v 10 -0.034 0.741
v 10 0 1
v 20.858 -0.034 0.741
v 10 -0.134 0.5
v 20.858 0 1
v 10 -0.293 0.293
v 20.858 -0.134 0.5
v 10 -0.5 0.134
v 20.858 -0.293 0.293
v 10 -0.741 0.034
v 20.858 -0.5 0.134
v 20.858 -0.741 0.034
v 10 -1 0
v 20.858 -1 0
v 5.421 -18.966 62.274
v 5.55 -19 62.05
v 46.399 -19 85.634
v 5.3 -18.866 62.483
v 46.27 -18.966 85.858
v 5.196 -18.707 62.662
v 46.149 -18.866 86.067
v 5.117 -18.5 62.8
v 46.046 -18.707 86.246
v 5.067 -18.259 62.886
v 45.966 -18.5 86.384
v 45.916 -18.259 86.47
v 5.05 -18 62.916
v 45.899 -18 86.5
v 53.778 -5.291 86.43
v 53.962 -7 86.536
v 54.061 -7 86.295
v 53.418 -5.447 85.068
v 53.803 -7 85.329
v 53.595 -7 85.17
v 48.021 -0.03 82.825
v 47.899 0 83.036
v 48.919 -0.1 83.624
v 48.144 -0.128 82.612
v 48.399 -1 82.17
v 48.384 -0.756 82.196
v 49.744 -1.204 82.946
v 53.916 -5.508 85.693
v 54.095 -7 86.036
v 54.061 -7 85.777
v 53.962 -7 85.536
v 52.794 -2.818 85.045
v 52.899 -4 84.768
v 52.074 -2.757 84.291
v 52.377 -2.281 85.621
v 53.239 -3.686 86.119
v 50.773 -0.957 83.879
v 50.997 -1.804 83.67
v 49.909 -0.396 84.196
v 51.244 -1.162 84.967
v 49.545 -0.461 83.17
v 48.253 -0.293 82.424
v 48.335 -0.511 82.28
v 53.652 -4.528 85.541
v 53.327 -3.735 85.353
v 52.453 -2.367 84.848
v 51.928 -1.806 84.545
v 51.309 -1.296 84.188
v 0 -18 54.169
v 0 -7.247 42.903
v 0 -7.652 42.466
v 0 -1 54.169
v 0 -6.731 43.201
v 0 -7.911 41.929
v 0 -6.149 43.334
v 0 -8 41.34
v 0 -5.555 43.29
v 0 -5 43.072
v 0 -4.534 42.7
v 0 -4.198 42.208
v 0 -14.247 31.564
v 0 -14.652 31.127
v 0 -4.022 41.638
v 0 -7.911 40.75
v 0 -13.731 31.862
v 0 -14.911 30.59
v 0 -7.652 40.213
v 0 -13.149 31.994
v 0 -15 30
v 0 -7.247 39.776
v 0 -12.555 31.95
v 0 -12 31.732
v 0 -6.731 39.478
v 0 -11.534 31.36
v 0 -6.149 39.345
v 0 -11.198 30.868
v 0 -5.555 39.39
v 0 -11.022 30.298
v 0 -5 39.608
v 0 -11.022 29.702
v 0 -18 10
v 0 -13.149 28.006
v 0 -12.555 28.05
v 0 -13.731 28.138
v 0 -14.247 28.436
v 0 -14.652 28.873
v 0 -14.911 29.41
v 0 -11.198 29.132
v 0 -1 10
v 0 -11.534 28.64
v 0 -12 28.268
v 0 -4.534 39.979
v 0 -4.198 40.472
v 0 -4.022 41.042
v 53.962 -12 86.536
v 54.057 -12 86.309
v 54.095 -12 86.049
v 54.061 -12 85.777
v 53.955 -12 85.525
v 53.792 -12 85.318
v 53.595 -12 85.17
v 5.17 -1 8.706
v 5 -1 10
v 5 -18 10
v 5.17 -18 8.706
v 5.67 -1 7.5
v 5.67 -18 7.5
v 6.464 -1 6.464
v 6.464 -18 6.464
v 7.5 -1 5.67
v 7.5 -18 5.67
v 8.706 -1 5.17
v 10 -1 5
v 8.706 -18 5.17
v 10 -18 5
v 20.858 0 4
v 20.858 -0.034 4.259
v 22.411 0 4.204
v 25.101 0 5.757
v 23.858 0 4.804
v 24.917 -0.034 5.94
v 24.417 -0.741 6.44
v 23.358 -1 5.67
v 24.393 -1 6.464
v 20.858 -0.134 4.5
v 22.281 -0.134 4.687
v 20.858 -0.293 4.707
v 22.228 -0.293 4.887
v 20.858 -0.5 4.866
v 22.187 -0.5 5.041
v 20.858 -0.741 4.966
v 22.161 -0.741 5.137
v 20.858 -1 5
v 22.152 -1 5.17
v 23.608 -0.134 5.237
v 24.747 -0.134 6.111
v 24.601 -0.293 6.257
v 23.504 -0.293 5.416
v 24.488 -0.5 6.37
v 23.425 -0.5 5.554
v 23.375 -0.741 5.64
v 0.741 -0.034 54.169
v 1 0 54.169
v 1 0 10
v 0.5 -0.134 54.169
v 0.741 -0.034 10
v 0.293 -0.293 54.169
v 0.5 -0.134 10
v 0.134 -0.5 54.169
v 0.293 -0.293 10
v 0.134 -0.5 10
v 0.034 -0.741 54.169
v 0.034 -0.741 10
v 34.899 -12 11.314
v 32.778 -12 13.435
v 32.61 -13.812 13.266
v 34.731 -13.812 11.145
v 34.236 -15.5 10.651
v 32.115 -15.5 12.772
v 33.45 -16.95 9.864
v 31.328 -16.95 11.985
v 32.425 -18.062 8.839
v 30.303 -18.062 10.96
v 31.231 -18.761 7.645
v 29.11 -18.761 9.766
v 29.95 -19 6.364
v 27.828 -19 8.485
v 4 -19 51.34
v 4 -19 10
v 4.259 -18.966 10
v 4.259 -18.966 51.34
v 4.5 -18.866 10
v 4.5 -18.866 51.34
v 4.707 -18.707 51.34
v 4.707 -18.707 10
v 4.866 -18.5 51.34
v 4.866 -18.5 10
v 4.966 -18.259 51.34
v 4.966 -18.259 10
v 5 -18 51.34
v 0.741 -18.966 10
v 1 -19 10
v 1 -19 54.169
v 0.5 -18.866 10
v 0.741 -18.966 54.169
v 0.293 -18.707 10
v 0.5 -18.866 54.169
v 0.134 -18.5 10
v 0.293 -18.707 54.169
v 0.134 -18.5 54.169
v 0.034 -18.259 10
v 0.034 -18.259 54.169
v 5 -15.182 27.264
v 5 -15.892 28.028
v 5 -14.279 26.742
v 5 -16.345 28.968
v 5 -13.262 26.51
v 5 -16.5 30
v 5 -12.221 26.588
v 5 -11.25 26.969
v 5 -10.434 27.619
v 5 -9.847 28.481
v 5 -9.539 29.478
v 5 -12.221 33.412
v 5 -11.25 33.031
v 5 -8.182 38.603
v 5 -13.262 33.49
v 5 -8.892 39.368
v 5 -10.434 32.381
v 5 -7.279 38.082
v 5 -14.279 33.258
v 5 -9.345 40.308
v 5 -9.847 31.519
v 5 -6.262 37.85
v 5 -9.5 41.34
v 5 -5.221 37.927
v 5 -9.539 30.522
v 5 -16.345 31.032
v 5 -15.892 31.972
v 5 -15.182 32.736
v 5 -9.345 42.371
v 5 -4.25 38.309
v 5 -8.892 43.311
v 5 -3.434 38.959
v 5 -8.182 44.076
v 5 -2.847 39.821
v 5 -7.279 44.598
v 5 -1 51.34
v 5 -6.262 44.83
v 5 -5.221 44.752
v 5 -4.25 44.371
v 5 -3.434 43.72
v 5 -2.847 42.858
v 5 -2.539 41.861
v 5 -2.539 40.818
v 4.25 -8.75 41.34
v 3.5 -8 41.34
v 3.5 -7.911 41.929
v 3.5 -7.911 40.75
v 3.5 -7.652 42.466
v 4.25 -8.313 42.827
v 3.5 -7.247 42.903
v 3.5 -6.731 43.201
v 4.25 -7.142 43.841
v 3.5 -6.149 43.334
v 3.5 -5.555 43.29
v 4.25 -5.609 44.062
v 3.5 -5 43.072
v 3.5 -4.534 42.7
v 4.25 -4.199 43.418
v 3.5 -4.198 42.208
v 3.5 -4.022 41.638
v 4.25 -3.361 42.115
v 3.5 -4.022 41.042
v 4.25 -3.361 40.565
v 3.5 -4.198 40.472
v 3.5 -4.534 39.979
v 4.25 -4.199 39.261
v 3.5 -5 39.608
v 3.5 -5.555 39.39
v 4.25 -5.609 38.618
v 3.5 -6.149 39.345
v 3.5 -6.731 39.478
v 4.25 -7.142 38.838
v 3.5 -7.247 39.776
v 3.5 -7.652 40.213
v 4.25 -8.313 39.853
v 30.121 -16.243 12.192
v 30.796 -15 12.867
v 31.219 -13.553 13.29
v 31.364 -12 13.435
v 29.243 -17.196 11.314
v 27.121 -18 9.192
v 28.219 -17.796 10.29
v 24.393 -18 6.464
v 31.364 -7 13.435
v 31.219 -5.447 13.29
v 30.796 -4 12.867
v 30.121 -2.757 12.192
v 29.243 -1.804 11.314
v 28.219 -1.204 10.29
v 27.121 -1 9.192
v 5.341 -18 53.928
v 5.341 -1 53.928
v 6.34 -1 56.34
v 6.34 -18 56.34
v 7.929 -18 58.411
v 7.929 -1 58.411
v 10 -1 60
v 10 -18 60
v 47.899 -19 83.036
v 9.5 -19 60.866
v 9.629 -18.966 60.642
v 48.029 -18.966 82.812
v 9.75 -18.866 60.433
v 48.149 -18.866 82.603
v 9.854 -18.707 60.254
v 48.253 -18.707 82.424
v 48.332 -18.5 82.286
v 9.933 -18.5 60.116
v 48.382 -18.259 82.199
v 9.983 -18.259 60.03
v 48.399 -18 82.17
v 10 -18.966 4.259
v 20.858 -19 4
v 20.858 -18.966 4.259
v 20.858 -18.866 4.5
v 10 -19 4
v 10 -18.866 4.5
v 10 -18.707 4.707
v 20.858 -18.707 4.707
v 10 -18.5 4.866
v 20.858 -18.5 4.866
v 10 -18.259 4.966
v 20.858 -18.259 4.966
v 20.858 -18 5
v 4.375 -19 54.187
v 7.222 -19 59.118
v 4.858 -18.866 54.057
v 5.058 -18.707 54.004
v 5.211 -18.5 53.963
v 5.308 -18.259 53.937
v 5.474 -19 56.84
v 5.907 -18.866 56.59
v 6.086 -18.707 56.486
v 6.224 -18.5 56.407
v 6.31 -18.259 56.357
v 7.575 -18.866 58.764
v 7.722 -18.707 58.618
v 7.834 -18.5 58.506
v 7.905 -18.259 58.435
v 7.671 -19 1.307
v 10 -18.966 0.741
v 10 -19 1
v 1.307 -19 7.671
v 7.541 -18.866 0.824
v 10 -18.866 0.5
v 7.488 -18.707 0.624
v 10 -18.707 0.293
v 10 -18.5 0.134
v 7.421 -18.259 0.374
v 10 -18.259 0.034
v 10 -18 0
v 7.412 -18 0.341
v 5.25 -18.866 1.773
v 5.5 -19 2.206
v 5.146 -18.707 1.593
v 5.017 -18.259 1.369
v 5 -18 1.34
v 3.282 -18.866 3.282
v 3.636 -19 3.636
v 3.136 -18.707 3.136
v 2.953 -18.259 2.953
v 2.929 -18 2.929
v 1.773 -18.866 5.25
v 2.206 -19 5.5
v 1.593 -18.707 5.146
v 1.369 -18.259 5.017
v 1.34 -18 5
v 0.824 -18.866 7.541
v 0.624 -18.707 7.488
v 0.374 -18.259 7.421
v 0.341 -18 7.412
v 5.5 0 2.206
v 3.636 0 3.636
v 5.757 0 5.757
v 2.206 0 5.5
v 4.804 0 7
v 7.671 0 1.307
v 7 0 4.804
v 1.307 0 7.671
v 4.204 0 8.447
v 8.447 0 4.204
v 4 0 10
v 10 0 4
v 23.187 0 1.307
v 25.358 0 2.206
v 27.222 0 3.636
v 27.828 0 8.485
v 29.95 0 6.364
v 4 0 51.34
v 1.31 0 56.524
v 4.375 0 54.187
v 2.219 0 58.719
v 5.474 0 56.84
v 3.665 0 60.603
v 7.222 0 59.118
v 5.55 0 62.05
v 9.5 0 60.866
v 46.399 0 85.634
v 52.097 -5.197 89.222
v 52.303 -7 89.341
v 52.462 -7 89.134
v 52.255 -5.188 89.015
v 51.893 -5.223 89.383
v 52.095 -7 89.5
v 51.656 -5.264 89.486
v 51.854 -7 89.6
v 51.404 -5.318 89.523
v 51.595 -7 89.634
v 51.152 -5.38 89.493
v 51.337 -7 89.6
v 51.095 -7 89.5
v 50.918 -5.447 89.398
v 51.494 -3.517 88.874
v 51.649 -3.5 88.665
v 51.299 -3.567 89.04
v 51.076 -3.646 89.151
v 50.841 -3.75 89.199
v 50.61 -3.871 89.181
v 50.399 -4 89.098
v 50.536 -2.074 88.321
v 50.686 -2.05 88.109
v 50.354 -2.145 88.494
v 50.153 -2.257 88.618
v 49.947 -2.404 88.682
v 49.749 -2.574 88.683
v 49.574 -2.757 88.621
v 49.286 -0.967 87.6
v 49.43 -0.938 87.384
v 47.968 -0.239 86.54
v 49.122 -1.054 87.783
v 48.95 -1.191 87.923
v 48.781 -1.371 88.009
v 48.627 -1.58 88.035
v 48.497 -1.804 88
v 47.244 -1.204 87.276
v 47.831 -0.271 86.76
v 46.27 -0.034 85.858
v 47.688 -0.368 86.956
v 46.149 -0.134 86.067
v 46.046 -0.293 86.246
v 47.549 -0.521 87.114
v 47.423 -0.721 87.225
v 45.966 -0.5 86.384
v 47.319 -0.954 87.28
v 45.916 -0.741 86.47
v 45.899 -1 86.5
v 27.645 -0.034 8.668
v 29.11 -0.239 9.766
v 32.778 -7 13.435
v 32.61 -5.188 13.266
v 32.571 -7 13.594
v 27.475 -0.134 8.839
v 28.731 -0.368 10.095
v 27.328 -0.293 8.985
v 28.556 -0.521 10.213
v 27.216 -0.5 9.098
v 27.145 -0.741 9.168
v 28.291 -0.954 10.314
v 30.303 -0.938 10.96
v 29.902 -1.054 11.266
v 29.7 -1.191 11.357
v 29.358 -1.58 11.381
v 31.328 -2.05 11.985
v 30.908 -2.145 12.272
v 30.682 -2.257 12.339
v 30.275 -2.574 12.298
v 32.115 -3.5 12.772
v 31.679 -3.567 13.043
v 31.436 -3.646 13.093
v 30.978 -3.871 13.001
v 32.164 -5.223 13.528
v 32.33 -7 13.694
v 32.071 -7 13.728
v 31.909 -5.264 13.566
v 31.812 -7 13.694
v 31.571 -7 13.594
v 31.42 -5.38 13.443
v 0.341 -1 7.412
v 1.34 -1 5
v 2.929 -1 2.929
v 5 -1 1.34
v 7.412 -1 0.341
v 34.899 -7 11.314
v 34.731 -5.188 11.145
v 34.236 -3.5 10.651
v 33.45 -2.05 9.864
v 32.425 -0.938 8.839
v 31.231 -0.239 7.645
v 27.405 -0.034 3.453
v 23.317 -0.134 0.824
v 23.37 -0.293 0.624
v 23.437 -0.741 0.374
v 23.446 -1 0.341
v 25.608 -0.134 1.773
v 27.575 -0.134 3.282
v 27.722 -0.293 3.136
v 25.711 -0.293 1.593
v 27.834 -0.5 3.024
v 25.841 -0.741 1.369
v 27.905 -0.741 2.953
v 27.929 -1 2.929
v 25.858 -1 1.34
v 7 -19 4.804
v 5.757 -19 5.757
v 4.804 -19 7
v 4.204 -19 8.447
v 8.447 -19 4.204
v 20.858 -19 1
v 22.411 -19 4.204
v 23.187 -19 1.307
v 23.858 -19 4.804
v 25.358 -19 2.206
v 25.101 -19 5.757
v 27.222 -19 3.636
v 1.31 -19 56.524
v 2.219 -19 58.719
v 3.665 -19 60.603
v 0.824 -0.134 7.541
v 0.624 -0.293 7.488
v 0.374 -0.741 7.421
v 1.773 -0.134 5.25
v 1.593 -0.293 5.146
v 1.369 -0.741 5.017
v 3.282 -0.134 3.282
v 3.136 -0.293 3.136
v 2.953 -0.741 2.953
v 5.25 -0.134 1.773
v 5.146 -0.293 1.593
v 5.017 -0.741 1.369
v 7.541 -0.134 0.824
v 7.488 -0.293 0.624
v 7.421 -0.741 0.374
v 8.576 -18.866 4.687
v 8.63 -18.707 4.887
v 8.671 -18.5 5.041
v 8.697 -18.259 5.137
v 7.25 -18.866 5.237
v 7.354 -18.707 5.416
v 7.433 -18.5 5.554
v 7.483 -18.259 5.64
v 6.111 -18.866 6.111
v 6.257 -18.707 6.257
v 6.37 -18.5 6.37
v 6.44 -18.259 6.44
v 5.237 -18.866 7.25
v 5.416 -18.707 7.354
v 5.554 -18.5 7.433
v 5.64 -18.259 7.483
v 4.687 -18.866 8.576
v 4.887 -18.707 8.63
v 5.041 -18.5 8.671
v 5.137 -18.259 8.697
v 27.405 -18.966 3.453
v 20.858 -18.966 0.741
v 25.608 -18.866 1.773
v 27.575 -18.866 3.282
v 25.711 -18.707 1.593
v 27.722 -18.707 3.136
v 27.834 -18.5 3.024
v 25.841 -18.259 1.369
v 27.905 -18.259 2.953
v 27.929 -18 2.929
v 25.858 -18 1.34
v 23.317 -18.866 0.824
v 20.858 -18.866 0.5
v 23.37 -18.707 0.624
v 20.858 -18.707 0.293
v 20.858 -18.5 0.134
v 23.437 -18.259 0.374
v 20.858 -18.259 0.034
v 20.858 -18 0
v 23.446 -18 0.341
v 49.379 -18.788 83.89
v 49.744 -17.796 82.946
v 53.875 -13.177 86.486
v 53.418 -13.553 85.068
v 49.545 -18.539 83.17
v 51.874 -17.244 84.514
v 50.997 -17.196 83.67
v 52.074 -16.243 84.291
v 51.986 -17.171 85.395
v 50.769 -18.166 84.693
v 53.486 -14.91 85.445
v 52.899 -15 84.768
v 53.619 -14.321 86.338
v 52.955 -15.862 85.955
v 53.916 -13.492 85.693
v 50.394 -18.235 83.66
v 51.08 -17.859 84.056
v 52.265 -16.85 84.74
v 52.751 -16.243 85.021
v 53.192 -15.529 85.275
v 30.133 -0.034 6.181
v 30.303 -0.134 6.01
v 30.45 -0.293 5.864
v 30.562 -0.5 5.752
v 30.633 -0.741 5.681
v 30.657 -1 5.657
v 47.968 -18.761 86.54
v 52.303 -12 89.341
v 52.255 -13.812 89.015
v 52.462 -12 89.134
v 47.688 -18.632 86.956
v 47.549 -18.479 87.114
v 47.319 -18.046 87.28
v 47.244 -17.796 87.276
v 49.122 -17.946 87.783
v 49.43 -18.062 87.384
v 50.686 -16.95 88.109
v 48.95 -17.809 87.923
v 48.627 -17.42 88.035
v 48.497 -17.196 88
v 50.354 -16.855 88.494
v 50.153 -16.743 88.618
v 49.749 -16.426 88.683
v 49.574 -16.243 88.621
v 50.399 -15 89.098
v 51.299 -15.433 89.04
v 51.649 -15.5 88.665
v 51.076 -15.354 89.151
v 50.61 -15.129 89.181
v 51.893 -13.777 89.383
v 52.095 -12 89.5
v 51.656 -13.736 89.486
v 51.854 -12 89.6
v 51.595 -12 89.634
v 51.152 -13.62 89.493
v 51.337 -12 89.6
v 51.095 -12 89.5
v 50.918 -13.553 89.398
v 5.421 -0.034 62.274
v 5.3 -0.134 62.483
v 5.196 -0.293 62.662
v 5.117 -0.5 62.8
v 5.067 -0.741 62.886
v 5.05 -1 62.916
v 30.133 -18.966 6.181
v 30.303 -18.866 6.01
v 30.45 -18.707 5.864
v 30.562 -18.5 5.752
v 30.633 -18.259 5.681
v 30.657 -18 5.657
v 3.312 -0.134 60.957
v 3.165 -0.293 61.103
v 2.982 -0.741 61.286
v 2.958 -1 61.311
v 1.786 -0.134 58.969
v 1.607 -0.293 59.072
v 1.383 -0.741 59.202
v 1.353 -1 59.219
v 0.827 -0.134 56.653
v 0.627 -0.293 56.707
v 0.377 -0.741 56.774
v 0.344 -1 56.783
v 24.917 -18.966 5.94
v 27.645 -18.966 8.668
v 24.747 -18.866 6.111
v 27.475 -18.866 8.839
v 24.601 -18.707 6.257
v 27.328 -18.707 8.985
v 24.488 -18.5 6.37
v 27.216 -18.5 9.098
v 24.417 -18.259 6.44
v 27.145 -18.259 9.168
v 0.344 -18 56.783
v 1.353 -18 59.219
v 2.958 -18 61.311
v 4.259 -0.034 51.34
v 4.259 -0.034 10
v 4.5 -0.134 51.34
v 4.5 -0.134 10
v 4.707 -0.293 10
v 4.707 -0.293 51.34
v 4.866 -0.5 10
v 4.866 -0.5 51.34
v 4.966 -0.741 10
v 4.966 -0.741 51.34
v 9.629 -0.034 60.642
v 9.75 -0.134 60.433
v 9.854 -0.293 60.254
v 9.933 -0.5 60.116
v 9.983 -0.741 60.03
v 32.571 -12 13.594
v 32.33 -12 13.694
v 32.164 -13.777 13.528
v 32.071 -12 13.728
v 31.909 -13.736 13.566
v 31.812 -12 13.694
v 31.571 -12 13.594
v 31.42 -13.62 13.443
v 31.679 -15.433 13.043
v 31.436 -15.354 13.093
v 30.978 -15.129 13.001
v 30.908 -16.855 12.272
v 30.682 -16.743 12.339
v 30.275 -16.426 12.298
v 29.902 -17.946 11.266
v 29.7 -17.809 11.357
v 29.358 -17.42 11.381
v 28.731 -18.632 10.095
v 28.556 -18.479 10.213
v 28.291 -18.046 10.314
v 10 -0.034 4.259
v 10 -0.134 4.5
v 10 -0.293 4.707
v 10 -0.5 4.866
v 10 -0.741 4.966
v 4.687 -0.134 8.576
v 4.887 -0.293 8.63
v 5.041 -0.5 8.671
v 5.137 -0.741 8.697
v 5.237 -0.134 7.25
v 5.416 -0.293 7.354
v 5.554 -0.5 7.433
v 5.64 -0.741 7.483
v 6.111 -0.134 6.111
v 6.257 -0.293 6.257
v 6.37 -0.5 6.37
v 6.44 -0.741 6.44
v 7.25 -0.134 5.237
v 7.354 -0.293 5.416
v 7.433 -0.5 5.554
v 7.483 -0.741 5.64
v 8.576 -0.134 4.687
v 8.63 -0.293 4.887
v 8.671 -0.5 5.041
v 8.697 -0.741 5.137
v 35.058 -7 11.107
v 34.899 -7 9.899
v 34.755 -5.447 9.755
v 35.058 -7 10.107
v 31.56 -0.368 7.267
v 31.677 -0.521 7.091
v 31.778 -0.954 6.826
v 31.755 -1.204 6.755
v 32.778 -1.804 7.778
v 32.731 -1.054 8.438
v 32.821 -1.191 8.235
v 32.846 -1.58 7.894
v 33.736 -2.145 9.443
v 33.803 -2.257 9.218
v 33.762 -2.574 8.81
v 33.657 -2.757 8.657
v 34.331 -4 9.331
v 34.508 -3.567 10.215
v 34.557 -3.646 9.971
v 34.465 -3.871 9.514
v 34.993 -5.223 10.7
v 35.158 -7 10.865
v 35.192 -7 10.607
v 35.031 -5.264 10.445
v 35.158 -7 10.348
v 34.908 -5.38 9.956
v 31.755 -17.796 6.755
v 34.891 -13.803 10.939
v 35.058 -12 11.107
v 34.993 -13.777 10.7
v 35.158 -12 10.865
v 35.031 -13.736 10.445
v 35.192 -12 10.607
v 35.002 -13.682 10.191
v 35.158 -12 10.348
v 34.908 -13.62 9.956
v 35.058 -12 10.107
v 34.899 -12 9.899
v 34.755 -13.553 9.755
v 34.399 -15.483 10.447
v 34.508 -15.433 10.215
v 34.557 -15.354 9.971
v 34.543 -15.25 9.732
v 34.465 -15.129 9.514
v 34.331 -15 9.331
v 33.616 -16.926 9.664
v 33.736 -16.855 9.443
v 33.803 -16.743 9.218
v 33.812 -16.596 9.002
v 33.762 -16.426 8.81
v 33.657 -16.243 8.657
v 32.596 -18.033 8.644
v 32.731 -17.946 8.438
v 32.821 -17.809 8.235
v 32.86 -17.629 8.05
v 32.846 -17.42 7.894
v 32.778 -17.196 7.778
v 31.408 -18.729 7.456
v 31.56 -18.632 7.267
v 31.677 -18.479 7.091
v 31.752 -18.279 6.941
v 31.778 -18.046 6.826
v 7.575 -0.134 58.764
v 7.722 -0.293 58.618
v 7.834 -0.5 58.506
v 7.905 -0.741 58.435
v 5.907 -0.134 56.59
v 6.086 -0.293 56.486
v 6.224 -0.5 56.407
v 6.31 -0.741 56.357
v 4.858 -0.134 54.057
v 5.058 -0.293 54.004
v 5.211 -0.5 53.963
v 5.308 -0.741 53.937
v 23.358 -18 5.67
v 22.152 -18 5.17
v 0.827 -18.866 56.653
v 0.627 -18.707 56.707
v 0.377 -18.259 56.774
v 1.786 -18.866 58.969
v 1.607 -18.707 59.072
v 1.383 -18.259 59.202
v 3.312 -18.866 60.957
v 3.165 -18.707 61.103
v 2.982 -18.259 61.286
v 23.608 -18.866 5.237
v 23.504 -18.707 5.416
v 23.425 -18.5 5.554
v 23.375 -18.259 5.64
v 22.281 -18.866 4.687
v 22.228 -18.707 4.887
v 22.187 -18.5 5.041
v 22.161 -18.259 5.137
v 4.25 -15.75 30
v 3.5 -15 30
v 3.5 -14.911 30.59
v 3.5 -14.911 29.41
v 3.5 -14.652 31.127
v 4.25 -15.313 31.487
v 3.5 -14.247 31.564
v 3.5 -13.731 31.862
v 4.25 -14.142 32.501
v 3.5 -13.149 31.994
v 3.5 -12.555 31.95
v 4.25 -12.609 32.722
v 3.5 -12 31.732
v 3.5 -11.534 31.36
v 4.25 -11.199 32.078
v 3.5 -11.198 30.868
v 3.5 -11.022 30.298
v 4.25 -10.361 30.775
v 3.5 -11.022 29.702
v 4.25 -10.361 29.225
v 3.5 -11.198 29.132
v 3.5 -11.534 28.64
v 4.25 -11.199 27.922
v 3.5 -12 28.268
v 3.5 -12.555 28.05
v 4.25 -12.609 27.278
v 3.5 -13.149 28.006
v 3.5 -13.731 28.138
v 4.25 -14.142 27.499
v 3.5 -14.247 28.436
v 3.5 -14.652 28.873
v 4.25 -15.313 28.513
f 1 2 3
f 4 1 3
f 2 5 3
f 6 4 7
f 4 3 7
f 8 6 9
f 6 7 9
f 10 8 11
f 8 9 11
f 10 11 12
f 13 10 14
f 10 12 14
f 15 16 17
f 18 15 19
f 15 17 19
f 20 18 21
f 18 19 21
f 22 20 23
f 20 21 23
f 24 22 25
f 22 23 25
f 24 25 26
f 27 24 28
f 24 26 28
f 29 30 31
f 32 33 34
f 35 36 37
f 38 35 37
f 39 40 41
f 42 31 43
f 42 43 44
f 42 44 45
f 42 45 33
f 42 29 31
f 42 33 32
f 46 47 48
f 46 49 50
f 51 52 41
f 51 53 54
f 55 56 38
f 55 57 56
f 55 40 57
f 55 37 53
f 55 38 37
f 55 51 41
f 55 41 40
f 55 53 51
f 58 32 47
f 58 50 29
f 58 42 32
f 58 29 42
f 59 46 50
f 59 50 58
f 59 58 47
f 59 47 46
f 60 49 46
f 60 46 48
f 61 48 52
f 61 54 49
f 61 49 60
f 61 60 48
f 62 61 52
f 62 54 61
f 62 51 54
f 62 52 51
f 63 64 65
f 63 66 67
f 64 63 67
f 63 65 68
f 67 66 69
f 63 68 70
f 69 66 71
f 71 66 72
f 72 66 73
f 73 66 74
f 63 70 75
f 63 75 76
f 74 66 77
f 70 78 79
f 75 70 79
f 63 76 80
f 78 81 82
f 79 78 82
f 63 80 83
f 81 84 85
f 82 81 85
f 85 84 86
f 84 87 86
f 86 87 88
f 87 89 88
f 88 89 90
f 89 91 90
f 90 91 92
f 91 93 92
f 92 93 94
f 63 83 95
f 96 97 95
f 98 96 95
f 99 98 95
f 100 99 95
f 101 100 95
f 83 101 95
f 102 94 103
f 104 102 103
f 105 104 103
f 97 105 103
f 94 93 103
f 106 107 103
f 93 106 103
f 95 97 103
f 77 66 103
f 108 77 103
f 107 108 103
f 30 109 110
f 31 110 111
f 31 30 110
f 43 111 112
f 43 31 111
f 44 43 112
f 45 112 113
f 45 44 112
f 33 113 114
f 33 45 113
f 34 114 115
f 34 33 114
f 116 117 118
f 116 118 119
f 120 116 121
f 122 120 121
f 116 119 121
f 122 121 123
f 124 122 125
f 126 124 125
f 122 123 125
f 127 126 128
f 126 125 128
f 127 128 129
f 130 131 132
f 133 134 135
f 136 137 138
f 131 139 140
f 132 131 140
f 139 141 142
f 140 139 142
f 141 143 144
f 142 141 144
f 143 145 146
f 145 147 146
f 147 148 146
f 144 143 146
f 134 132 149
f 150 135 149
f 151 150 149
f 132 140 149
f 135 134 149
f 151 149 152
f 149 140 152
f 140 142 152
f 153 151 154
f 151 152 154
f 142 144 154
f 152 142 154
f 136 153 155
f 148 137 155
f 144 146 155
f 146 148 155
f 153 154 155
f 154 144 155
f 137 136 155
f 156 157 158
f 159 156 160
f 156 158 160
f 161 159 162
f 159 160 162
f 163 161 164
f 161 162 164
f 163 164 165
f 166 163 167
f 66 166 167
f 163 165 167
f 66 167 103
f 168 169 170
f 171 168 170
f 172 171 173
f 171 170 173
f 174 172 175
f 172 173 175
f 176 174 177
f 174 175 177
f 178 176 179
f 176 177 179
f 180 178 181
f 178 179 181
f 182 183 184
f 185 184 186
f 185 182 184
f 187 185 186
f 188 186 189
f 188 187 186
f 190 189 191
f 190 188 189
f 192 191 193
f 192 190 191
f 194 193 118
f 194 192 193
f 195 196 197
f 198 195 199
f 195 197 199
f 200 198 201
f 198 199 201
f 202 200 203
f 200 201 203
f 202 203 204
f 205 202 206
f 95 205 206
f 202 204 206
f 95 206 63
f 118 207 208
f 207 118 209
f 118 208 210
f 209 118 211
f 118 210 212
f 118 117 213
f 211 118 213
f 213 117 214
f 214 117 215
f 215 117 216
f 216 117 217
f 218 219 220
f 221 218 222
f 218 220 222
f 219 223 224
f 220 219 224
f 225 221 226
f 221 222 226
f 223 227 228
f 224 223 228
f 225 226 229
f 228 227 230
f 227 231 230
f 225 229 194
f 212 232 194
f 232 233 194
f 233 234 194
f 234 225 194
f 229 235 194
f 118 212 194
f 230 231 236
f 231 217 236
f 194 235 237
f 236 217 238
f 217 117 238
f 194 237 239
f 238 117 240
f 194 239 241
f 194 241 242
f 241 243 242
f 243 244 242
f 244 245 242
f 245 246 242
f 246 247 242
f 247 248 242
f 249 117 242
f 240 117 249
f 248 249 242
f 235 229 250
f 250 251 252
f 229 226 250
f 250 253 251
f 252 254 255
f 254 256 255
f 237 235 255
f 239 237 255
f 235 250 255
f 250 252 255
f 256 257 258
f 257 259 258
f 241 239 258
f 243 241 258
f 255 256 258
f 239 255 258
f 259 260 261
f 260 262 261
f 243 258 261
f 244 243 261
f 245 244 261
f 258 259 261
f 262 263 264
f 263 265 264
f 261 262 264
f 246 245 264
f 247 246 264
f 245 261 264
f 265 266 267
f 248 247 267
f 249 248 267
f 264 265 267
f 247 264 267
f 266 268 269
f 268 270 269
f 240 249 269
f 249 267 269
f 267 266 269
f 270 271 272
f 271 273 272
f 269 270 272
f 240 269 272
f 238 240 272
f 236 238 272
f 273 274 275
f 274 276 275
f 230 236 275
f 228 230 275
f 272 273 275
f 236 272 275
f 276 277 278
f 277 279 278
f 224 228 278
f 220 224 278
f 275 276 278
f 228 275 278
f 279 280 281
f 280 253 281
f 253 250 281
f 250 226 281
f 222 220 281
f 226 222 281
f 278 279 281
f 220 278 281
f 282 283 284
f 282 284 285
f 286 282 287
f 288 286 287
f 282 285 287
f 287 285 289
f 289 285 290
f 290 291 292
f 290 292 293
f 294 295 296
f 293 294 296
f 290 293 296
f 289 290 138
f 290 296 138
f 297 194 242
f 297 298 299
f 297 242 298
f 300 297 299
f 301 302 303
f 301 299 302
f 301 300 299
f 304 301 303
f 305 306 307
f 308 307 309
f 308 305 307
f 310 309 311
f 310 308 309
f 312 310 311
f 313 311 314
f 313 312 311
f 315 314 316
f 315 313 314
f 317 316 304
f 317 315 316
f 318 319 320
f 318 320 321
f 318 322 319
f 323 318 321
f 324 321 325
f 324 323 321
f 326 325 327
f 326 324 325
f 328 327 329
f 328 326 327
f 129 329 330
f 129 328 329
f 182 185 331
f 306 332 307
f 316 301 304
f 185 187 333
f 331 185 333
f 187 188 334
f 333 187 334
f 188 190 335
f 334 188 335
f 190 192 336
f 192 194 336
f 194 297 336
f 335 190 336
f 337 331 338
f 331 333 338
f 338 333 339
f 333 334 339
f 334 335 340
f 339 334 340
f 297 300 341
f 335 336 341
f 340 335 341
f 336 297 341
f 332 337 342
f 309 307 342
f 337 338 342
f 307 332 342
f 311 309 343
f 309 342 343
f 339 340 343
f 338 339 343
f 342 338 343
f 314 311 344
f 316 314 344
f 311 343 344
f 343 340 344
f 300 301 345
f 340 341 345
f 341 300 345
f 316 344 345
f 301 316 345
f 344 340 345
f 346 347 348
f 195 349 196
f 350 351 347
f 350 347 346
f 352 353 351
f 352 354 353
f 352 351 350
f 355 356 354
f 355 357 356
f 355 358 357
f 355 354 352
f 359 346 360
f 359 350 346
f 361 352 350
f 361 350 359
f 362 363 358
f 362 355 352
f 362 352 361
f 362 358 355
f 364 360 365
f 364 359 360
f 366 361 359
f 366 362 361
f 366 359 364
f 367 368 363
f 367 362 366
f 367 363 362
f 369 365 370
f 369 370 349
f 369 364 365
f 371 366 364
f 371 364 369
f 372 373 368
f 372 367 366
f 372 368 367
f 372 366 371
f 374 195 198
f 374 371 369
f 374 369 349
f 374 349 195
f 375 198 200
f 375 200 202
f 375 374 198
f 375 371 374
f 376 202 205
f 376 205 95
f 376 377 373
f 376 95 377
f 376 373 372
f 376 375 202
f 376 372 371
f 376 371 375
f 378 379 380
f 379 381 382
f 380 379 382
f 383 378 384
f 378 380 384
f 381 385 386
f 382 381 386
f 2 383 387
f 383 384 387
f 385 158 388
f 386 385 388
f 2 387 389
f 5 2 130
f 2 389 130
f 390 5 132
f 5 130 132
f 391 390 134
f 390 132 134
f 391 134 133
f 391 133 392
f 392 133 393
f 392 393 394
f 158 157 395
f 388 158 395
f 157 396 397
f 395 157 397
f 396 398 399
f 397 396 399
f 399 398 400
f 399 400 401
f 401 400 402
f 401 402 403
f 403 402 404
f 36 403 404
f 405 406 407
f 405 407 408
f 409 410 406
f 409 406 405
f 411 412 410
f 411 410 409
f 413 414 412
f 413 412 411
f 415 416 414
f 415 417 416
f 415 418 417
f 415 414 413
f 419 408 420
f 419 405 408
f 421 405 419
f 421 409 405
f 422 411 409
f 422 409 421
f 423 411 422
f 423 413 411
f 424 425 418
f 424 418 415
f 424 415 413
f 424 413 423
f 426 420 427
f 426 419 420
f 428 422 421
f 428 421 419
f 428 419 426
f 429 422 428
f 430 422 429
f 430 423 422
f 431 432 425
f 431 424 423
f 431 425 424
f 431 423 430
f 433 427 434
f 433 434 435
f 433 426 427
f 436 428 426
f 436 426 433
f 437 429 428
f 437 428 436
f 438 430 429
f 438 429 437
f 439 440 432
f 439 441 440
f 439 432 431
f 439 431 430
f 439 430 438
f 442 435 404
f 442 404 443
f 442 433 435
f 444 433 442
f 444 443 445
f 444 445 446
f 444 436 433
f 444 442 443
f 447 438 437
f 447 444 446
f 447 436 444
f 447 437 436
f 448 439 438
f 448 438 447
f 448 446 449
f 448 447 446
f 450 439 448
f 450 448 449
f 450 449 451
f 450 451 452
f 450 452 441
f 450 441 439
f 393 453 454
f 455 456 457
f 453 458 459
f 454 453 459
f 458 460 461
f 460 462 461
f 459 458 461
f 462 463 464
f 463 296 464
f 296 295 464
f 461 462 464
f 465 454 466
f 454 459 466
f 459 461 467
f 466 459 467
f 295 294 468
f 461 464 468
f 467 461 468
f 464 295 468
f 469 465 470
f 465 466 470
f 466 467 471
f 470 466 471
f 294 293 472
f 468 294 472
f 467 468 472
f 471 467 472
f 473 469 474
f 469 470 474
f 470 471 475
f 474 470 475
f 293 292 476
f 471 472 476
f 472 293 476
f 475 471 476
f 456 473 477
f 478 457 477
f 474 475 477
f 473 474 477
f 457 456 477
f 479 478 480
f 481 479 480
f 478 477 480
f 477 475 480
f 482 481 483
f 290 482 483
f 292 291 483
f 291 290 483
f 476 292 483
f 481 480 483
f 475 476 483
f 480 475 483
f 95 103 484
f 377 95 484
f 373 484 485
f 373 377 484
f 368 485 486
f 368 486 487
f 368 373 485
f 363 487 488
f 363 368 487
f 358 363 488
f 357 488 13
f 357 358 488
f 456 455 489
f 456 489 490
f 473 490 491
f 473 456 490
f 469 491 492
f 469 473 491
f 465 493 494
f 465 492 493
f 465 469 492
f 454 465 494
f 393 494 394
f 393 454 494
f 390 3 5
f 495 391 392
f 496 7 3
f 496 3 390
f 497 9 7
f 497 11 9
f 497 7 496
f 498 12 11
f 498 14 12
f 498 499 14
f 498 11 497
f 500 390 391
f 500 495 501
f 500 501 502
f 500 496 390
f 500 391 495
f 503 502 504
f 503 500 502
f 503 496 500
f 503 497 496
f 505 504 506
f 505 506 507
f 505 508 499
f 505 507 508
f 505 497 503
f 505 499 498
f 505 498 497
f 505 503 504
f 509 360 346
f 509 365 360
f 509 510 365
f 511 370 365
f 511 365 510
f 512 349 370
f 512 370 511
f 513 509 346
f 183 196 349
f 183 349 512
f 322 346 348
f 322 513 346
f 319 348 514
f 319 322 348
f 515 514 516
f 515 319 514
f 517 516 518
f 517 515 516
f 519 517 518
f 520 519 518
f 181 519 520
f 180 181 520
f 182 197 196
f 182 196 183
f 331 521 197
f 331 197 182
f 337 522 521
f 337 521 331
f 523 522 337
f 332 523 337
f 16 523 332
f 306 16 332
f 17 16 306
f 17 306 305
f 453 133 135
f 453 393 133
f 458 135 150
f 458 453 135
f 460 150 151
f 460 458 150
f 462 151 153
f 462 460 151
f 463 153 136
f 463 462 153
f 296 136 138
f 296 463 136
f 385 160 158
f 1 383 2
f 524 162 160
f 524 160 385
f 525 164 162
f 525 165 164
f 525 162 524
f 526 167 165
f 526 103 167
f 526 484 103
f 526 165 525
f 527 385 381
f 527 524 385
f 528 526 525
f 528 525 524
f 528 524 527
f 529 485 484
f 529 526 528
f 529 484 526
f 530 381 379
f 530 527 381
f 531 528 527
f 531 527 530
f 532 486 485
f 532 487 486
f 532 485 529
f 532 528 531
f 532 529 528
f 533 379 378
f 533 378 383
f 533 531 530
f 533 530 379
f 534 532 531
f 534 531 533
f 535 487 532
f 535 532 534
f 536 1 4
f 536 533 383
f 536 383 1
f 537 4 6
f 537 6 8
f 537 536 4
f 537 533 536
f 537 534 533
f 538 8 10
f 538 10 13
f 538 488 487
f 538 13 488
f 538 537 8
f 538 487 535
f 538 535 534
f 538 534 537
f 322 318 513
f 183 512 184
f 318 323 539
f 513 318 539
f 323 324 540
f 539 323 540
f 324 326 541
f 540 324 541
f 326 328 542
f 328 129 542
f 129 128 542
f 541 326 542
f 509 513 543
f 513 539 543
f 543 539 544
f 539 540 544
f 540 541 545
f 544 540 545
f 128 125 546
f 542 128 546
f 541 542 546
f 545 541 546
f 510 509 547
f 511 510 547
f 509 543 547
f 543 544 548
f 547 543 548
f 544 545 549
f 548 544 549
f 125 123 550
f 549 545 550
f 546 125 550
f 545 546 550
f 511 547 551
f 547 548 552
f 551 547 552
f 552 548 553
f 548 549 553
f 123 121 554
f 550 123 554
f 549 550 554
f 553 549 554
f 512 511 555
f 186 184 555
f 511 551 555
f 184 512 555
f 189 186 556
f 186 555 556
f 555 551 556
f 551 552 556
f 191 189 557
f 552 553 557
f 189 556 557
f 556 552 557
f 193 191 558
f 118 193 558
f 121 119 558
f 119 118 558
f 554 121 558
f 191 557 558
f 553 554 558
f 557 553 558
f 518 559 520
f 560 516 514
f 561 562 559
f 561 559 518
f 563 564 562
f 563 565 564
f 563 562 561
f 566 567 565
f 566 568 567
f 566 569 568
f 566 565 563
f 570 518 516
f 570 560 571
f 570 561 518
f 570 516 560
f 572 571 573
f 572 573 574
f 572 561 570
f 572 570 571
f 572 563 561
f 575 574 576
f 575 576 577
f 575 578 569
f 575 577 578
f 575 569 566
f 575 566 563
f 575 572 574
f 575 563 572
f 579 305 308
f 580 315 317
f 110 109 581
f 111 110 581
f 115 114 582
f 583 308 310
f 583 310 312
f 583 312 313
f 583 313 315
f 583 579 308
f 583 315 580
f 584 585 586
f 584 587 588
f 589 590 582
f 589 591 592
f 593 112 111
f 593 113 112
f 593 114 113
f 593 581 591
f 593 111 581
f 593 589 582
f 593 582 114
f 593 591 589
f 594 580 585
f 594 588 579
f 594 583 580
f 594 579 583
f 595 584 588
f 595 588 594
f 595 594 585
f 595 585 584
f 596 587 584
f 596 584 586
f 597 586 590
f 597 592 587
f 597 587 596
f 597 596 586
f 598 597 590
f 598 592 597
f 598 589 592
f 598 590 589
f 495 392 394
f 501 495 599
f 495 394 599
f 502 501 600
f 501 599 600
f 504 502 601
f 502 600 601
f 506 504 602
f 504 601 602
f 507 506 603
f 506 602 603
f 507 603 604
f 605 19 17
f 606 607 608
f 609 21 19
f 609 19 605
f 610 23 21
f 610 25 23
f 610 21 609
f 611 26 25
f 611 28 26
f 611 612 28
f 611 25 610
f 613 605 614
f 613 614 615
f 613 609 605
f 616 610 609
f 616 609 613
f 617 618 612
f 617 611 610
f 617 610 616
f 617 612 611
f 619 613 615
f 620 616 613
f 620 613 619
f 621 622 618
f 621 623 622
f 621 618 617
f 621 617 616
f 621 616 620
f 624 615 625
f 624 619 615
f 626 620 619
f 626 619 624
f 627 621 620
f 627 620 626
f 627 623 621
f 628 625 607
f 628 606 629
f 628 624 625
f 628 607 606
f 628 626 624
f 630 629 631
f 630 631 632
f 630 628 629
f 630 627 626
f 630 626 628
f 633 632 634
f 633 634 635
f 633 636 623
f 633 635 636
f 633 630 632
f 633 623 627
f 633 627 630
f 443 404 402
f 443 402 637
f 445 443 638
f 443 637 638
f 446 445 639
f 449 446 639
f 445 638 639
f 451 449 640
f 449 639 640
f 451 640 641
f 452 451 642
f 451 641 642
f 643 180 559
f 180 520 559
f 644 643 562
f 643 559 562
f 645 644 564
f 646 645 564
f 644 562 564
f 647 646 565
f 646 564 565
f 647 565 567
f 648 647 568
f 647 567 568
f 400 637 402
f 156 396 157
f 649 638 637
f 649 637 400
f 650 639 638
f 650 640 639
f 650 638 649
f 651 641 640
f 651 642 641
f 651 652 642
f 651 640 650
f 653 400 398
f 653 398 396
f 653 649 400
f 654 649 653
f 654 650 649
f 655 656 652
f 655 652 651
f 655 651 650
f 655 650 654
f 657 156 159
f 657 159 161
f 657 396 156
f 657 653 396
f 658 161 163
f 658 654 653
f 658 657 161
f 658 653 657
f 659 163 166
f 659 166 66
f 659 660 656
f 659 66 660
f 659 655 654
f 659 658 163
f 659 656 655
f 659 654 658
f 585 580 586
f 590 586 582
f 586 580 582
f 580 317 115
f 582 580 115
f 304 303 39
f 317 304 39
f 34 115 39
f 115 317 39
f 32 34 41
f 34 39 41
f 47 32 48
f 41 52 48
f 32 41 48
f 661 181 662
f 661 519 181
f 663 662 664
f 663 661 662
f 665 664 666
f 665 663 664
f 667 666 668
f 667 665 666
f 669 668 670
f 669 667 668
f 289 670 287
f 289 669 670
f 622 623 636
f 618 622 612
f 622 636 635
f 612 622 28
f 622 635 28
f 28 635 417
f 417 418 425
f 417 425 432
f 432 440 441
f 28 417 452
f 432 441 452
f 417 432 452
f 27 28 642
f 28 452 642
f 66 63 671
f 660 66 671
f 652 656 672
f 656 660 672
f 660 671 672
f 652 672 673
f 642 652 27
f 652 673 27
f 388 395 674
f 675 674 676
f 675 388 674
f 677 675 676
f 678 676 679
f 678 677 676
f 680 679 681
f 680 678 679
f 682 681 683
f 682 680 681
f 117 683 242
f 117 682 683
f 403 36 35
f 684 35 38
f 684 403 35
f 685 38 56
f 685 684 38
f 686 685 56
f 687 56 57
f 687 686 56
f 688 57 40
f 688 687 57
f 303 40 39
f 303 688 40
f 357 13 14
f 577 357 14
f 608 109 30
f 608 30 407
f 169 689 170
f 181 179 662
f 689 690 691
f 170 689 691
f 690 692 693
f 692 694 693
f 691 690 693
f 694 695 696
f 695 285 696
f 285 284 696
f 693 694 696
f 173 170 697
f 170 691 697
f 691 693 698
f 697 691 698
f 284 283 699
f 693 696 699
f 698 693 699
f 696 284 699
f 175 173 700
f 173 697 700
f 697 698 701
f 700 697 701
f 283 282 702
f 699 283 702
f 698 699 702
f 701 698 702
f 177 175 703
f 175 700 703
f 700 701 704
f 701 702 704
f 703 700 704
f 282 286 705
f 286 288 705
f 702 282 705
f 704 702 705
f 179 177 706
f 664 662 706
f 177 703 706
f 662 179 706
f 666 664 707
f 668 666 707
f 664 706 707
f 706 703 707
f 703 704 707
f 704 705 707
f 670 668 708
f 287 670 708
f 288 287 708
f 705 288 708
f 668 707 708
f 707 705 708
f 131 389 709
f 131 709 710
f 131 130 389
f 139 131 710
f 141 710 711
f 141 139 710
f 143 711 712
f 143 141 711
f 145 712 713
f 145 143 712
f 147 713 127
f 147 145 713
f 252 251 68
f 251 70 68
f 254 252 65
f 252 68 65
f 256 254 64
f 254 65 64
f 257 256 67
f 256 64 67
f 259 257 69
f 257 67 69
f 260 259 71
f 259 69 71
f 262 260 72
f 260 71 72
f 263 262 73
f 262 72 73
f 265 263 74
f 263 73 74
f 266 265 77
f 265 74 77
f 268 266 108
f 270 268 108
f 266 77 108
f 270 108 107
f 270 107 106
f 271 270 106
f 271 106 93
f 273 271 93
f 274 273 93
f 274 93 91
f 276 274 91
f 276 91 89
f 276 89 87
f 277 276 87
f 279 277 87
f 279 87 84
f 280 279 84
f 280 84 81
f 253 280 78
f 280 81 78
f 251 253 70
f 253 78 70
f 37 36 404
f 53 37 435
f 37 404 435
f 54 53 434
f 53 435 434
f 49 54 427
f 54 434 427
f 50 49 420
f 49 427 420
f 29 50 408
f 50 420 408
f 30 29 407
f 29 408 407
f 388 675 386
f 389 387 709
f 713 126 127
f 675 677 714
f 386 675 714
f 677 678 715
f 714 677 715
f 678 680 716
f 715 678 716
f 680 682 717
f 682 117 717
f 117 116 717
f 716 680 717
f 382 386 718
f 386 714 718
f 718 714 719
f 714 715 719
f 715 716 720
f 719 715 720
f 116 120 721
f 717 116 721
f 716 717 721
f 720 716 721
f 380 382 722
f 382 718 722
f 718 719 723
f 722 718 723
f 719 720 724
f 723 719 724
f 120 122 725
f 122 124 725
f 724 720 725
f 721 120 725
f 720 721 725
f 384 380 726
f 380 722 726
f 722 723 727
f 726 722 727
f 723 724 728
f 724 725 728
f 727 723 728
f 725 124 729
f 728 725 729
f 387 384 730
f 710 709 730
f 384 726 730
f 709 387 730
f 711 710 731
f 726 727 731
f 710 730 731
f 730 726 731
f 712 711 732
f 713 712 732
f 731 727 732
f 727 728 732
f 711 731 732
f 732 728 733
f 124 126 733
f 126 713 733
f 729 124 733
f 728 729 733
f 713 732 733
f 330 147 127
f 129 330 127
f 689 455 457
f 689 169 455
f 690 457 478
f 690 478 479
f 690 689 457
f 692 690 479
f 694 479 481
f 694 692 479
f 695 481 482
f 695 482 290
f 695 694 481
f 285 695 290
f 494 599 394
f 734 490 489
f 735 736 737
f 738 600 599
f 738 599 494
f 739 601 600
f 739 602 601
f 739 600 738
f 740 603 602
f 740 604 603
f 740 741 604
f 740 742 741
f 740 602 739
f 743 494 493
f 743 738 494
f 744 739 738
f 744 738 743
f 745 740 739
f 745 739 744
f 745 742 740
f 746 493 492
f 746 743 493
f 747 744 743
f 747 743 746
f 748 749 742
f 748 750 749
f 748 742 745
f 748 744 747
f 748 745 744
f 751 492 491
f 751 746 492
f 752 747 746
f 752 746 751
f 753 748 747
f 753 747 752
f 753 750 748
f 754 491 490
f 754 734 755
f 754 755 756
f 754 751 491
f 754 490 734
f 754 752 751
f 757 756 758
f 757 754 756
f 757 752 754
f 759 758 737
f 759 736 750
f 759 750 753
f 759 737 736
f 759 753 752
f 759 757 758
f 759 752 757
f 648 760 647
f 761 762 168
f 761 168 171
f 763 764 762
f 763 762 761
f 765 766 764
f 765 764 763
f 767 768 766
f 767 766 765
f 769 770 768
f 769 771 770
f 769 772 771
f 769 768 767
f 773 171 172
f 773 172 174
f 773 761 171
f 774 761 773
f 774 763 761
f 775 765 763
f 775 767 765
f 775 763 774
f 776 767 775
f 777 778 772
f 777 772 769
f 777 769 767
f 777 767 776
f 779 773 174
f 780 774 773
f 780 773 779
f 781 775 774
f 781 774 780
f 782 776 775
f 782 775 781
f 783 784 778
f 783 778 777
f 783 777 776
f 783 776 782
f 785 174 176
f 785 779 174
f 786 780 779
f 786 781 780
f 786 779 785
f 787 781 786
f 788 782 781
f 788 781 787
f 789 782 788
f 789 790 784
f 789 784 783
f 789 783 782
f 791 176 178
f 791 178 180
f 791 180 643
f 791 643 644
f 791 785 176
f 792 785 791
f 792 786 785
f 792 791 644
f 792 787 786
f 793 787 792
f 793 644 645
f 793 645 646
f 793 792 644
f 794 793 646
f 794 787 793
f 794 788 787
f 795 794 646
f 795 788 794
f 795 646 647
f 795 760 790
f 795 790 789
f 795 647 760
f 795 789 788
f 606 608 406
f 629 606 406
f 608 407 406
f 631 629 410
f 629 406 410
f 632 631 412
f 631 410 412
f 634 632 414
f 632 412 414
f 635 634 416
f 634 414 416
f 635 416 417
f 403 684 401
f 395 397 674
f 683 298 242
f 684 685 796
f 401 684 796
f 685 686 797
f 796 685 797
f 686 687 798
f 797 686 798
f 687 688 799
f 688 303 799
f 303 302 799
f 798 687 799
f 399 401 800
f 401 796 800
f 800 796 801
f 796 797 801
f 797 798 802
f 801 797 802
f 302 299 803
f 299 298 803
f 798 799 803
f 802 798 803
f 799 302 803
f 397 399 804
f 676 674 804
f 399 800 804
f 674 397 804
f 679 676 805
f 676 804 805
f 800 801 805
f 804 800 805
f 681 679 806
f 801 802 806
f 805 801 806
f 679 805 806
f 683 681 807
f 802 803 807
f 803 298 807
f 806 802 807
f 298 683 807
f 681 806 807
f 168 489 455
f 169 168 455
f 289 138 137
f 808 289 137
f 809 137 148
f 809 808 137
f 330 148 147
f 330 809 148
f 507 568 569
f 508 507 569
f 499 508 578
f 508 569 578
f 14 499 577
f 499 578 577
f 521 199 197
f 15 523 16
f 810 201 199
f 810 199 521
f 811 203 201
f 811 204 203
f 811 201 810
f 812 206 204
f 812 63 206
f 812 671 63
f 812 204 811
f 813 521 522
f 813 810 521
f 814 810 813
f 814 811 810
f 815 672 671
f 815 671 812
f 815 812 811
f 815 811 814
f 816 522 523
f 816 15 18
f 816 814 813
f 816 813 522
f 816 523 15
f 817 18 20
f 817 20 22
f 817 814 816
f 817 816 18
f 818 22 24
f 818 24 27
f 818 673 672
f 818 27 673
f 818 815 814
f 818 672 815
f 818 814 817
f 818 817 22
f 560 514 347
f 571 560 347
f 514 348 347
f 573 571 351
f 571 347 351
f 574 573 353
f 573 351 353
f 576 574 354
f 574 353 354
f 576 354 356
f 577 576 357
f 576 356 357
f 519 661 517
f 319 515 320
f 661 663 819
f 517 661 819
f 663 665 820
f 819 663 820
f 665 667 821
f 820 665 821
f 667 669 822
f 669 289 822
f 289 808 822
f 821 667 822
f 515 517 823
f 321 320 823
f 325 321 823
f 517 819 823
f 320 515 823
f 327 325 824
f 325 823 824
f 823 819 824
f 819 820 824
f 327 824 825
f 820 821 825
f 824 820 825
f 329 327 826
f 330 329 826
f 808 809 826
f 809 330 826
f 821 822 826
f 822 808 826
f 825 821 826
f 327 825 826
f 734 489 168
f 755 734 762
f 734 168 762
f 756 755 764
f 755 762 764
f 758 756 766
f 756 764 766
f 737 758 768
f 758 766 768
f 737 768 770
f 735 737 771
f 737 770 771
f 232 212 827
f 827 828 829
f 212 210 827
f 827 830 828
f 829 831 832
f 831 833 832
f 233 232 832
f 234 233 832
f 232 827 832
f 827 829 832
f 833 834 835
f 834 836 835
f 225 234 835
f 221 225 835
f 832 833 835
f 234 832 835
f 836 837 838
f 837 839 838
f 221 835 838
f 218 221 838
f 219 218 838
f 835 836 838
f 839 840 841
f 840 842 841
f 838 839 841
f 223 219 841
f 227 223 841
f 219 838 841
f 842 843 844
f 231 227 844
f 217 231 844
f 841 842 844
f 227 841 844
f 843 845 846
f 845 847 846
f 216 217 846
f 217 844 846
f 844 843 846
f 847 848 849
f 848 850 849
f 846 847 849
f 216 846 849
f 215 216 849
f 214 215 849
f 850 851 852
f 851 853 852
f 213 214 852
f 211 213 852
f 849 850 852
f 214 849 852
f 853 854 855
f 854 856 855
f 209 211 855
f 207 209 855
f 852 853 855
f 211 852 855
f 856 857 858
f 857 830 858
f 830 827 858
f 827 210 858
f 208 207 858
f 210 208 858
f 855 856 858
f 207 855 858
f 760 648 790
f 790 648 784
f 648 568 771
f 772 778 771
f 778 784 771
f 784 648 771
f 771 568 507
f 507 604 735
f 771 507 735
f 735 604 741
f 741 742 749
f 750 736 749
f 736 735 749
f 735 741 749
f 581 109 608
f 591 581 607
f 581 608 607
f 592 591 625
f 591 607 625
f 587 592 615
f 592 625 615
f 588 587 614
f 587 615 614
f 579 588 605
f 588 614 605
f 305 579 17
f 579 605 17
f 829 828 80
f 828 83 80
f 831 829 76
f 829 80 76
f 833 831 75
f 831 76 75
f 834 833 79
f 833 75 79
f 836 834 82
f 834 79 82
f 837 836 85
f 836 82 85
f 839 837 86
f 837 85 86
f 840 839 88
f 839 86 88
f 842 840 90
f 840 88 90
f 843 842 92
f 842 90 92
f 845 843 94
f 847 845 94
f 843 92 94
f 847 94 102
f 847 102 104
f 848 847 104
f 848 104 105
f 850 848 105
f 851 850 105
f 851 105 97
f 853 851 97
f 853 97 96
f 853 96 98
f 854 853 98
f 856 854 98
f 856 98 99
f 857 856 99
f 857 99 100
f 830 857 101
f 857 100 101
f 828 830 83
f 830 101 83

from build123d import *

# Parameters (mm, degrees)
F1_DEPTH        = 19
F2_R            = 10
F3_R            = 5
F4_R            = 10
F5_R            = 10.1
F6_R            = 5
F7_R            = 10
F8_R            = 7
F9_R            = 7
F10_R           = 7
F11_R           = 1
F12_R           = 1
F14_D           = 4
F14_CSINK_D     = 7
F14_CSINK_ANGLE = 90


with BuildPart() as f1:
    # F0 (on Front) → F1 (new body)
    with BuildSketch(Plane.XZ):
        Polygon((0, 60), (0, 0), (25, 0), (35.606602, 10.606602), (32.071068, 14.142136), (22.928932, 5), (5, 5), (5, 57.113249), (54.461524, 85.669873), (51.961524, 90), align=None)
    extrude(amount=F1_DEPTH)

    # F2
    f2_edges = [f1.edges().sort_by_distance(p)[0] for p in [
        (5, -9.5, 57.113249),
    ]]
    fillet(f2_edges, radius=F2_R)

    # F3
    f3_edges = [f1.edges().sort_by_distance(p)[0] for p in [
        (5, -9.5, 5),
    ]]
    fillet(f3_edges, radius=F3_R)

    # F4
    f4_edges = [f1.edges().sort_by_distance(p)[0] for p in [
        (0, -9.5, 0),
    ]]
    fillet(f4_edges, radius=F4_R)

    # F5
    f5_edges = [f1.edges().sort_by_distance(p)[0] for p in [
        (0, -9.5, 60),
    ]]
    fillet(f5_edges, radius=F5_R)

    # F6
    f6_edges = [f1.edges().sort_by_distance(p)[0] for p in [
        (22.928932, -9.5, 5),
    ]]
    fillet(f6_edges, radius=F6_R)

    # F7
    f7_edges = [f1.edges().sort_by_distance(p)[0] for p in [
        (25, -9.5, 0),
    ]]
    fillet(f7_edges, radius=F7_R)

    # F8
    f8_edges = [f1.edges().sort_by_distance(p)[0] for p in [
        (53.211524, -19, 87.834936),
        (53.211524, 0, 87.834936),
    ]]
    fillet(f8_edges, radius=F8_R)

    # F9
    f9_edges = [f1.edges().sort_by_distance(p)[0] for p in [
        (33.838835, -19, 12.374369),
    ]]
    fillet(f9_edges, radius=F9_R)

    # F10
    f10_edges = [f1.edges().sort_by_distance(p)[0] for p in [
        (33.838835, 0, 12.374369),
    ]]
    fillet(f10_edges, radius=F10_R)

    # F11
    f11_edges = [f1.edges().sort_by_distance(p)[0] for p in [
        (25.474673, 0, 74.707809),
        (50.185953, -2.050253, 88.974874),
        (5.05, -9.5, 62.915619),
        (51.961524, -9.5, 90),
        (25.474673, -19, 74.707809),
        (50.185953, -16.949747, 88.974874),
    ]]
    fillet(f11_edges, radius=F11_R)

    # F12
    f12_edges = [f1.edges().sort_by_distance(p)[0] for p in [
        (32.071068, -9.5, 14.142136),
        (30.62132, -2.050253, 12.692388),
        (30.62132, -16.949747, 12.692388),
        (25.757359, 0, 7.828427),
        (25.757359, -19, 7.828427),
        (24.393398, -9.5, 6.464466),
    ]]
    fillet(f12_edges, radius=F12_R)

    # F14 (through all)
    with Locations(Plane.YZ.offset(5)):
        with Locations((-6, 41.339746), (-13, 30)):
            CounterSinkHole(F14_D / 2, F14_CSINK_D / 2, counter_sink_angle=F14_CSINK_ANGLE)


solid = f1.part
